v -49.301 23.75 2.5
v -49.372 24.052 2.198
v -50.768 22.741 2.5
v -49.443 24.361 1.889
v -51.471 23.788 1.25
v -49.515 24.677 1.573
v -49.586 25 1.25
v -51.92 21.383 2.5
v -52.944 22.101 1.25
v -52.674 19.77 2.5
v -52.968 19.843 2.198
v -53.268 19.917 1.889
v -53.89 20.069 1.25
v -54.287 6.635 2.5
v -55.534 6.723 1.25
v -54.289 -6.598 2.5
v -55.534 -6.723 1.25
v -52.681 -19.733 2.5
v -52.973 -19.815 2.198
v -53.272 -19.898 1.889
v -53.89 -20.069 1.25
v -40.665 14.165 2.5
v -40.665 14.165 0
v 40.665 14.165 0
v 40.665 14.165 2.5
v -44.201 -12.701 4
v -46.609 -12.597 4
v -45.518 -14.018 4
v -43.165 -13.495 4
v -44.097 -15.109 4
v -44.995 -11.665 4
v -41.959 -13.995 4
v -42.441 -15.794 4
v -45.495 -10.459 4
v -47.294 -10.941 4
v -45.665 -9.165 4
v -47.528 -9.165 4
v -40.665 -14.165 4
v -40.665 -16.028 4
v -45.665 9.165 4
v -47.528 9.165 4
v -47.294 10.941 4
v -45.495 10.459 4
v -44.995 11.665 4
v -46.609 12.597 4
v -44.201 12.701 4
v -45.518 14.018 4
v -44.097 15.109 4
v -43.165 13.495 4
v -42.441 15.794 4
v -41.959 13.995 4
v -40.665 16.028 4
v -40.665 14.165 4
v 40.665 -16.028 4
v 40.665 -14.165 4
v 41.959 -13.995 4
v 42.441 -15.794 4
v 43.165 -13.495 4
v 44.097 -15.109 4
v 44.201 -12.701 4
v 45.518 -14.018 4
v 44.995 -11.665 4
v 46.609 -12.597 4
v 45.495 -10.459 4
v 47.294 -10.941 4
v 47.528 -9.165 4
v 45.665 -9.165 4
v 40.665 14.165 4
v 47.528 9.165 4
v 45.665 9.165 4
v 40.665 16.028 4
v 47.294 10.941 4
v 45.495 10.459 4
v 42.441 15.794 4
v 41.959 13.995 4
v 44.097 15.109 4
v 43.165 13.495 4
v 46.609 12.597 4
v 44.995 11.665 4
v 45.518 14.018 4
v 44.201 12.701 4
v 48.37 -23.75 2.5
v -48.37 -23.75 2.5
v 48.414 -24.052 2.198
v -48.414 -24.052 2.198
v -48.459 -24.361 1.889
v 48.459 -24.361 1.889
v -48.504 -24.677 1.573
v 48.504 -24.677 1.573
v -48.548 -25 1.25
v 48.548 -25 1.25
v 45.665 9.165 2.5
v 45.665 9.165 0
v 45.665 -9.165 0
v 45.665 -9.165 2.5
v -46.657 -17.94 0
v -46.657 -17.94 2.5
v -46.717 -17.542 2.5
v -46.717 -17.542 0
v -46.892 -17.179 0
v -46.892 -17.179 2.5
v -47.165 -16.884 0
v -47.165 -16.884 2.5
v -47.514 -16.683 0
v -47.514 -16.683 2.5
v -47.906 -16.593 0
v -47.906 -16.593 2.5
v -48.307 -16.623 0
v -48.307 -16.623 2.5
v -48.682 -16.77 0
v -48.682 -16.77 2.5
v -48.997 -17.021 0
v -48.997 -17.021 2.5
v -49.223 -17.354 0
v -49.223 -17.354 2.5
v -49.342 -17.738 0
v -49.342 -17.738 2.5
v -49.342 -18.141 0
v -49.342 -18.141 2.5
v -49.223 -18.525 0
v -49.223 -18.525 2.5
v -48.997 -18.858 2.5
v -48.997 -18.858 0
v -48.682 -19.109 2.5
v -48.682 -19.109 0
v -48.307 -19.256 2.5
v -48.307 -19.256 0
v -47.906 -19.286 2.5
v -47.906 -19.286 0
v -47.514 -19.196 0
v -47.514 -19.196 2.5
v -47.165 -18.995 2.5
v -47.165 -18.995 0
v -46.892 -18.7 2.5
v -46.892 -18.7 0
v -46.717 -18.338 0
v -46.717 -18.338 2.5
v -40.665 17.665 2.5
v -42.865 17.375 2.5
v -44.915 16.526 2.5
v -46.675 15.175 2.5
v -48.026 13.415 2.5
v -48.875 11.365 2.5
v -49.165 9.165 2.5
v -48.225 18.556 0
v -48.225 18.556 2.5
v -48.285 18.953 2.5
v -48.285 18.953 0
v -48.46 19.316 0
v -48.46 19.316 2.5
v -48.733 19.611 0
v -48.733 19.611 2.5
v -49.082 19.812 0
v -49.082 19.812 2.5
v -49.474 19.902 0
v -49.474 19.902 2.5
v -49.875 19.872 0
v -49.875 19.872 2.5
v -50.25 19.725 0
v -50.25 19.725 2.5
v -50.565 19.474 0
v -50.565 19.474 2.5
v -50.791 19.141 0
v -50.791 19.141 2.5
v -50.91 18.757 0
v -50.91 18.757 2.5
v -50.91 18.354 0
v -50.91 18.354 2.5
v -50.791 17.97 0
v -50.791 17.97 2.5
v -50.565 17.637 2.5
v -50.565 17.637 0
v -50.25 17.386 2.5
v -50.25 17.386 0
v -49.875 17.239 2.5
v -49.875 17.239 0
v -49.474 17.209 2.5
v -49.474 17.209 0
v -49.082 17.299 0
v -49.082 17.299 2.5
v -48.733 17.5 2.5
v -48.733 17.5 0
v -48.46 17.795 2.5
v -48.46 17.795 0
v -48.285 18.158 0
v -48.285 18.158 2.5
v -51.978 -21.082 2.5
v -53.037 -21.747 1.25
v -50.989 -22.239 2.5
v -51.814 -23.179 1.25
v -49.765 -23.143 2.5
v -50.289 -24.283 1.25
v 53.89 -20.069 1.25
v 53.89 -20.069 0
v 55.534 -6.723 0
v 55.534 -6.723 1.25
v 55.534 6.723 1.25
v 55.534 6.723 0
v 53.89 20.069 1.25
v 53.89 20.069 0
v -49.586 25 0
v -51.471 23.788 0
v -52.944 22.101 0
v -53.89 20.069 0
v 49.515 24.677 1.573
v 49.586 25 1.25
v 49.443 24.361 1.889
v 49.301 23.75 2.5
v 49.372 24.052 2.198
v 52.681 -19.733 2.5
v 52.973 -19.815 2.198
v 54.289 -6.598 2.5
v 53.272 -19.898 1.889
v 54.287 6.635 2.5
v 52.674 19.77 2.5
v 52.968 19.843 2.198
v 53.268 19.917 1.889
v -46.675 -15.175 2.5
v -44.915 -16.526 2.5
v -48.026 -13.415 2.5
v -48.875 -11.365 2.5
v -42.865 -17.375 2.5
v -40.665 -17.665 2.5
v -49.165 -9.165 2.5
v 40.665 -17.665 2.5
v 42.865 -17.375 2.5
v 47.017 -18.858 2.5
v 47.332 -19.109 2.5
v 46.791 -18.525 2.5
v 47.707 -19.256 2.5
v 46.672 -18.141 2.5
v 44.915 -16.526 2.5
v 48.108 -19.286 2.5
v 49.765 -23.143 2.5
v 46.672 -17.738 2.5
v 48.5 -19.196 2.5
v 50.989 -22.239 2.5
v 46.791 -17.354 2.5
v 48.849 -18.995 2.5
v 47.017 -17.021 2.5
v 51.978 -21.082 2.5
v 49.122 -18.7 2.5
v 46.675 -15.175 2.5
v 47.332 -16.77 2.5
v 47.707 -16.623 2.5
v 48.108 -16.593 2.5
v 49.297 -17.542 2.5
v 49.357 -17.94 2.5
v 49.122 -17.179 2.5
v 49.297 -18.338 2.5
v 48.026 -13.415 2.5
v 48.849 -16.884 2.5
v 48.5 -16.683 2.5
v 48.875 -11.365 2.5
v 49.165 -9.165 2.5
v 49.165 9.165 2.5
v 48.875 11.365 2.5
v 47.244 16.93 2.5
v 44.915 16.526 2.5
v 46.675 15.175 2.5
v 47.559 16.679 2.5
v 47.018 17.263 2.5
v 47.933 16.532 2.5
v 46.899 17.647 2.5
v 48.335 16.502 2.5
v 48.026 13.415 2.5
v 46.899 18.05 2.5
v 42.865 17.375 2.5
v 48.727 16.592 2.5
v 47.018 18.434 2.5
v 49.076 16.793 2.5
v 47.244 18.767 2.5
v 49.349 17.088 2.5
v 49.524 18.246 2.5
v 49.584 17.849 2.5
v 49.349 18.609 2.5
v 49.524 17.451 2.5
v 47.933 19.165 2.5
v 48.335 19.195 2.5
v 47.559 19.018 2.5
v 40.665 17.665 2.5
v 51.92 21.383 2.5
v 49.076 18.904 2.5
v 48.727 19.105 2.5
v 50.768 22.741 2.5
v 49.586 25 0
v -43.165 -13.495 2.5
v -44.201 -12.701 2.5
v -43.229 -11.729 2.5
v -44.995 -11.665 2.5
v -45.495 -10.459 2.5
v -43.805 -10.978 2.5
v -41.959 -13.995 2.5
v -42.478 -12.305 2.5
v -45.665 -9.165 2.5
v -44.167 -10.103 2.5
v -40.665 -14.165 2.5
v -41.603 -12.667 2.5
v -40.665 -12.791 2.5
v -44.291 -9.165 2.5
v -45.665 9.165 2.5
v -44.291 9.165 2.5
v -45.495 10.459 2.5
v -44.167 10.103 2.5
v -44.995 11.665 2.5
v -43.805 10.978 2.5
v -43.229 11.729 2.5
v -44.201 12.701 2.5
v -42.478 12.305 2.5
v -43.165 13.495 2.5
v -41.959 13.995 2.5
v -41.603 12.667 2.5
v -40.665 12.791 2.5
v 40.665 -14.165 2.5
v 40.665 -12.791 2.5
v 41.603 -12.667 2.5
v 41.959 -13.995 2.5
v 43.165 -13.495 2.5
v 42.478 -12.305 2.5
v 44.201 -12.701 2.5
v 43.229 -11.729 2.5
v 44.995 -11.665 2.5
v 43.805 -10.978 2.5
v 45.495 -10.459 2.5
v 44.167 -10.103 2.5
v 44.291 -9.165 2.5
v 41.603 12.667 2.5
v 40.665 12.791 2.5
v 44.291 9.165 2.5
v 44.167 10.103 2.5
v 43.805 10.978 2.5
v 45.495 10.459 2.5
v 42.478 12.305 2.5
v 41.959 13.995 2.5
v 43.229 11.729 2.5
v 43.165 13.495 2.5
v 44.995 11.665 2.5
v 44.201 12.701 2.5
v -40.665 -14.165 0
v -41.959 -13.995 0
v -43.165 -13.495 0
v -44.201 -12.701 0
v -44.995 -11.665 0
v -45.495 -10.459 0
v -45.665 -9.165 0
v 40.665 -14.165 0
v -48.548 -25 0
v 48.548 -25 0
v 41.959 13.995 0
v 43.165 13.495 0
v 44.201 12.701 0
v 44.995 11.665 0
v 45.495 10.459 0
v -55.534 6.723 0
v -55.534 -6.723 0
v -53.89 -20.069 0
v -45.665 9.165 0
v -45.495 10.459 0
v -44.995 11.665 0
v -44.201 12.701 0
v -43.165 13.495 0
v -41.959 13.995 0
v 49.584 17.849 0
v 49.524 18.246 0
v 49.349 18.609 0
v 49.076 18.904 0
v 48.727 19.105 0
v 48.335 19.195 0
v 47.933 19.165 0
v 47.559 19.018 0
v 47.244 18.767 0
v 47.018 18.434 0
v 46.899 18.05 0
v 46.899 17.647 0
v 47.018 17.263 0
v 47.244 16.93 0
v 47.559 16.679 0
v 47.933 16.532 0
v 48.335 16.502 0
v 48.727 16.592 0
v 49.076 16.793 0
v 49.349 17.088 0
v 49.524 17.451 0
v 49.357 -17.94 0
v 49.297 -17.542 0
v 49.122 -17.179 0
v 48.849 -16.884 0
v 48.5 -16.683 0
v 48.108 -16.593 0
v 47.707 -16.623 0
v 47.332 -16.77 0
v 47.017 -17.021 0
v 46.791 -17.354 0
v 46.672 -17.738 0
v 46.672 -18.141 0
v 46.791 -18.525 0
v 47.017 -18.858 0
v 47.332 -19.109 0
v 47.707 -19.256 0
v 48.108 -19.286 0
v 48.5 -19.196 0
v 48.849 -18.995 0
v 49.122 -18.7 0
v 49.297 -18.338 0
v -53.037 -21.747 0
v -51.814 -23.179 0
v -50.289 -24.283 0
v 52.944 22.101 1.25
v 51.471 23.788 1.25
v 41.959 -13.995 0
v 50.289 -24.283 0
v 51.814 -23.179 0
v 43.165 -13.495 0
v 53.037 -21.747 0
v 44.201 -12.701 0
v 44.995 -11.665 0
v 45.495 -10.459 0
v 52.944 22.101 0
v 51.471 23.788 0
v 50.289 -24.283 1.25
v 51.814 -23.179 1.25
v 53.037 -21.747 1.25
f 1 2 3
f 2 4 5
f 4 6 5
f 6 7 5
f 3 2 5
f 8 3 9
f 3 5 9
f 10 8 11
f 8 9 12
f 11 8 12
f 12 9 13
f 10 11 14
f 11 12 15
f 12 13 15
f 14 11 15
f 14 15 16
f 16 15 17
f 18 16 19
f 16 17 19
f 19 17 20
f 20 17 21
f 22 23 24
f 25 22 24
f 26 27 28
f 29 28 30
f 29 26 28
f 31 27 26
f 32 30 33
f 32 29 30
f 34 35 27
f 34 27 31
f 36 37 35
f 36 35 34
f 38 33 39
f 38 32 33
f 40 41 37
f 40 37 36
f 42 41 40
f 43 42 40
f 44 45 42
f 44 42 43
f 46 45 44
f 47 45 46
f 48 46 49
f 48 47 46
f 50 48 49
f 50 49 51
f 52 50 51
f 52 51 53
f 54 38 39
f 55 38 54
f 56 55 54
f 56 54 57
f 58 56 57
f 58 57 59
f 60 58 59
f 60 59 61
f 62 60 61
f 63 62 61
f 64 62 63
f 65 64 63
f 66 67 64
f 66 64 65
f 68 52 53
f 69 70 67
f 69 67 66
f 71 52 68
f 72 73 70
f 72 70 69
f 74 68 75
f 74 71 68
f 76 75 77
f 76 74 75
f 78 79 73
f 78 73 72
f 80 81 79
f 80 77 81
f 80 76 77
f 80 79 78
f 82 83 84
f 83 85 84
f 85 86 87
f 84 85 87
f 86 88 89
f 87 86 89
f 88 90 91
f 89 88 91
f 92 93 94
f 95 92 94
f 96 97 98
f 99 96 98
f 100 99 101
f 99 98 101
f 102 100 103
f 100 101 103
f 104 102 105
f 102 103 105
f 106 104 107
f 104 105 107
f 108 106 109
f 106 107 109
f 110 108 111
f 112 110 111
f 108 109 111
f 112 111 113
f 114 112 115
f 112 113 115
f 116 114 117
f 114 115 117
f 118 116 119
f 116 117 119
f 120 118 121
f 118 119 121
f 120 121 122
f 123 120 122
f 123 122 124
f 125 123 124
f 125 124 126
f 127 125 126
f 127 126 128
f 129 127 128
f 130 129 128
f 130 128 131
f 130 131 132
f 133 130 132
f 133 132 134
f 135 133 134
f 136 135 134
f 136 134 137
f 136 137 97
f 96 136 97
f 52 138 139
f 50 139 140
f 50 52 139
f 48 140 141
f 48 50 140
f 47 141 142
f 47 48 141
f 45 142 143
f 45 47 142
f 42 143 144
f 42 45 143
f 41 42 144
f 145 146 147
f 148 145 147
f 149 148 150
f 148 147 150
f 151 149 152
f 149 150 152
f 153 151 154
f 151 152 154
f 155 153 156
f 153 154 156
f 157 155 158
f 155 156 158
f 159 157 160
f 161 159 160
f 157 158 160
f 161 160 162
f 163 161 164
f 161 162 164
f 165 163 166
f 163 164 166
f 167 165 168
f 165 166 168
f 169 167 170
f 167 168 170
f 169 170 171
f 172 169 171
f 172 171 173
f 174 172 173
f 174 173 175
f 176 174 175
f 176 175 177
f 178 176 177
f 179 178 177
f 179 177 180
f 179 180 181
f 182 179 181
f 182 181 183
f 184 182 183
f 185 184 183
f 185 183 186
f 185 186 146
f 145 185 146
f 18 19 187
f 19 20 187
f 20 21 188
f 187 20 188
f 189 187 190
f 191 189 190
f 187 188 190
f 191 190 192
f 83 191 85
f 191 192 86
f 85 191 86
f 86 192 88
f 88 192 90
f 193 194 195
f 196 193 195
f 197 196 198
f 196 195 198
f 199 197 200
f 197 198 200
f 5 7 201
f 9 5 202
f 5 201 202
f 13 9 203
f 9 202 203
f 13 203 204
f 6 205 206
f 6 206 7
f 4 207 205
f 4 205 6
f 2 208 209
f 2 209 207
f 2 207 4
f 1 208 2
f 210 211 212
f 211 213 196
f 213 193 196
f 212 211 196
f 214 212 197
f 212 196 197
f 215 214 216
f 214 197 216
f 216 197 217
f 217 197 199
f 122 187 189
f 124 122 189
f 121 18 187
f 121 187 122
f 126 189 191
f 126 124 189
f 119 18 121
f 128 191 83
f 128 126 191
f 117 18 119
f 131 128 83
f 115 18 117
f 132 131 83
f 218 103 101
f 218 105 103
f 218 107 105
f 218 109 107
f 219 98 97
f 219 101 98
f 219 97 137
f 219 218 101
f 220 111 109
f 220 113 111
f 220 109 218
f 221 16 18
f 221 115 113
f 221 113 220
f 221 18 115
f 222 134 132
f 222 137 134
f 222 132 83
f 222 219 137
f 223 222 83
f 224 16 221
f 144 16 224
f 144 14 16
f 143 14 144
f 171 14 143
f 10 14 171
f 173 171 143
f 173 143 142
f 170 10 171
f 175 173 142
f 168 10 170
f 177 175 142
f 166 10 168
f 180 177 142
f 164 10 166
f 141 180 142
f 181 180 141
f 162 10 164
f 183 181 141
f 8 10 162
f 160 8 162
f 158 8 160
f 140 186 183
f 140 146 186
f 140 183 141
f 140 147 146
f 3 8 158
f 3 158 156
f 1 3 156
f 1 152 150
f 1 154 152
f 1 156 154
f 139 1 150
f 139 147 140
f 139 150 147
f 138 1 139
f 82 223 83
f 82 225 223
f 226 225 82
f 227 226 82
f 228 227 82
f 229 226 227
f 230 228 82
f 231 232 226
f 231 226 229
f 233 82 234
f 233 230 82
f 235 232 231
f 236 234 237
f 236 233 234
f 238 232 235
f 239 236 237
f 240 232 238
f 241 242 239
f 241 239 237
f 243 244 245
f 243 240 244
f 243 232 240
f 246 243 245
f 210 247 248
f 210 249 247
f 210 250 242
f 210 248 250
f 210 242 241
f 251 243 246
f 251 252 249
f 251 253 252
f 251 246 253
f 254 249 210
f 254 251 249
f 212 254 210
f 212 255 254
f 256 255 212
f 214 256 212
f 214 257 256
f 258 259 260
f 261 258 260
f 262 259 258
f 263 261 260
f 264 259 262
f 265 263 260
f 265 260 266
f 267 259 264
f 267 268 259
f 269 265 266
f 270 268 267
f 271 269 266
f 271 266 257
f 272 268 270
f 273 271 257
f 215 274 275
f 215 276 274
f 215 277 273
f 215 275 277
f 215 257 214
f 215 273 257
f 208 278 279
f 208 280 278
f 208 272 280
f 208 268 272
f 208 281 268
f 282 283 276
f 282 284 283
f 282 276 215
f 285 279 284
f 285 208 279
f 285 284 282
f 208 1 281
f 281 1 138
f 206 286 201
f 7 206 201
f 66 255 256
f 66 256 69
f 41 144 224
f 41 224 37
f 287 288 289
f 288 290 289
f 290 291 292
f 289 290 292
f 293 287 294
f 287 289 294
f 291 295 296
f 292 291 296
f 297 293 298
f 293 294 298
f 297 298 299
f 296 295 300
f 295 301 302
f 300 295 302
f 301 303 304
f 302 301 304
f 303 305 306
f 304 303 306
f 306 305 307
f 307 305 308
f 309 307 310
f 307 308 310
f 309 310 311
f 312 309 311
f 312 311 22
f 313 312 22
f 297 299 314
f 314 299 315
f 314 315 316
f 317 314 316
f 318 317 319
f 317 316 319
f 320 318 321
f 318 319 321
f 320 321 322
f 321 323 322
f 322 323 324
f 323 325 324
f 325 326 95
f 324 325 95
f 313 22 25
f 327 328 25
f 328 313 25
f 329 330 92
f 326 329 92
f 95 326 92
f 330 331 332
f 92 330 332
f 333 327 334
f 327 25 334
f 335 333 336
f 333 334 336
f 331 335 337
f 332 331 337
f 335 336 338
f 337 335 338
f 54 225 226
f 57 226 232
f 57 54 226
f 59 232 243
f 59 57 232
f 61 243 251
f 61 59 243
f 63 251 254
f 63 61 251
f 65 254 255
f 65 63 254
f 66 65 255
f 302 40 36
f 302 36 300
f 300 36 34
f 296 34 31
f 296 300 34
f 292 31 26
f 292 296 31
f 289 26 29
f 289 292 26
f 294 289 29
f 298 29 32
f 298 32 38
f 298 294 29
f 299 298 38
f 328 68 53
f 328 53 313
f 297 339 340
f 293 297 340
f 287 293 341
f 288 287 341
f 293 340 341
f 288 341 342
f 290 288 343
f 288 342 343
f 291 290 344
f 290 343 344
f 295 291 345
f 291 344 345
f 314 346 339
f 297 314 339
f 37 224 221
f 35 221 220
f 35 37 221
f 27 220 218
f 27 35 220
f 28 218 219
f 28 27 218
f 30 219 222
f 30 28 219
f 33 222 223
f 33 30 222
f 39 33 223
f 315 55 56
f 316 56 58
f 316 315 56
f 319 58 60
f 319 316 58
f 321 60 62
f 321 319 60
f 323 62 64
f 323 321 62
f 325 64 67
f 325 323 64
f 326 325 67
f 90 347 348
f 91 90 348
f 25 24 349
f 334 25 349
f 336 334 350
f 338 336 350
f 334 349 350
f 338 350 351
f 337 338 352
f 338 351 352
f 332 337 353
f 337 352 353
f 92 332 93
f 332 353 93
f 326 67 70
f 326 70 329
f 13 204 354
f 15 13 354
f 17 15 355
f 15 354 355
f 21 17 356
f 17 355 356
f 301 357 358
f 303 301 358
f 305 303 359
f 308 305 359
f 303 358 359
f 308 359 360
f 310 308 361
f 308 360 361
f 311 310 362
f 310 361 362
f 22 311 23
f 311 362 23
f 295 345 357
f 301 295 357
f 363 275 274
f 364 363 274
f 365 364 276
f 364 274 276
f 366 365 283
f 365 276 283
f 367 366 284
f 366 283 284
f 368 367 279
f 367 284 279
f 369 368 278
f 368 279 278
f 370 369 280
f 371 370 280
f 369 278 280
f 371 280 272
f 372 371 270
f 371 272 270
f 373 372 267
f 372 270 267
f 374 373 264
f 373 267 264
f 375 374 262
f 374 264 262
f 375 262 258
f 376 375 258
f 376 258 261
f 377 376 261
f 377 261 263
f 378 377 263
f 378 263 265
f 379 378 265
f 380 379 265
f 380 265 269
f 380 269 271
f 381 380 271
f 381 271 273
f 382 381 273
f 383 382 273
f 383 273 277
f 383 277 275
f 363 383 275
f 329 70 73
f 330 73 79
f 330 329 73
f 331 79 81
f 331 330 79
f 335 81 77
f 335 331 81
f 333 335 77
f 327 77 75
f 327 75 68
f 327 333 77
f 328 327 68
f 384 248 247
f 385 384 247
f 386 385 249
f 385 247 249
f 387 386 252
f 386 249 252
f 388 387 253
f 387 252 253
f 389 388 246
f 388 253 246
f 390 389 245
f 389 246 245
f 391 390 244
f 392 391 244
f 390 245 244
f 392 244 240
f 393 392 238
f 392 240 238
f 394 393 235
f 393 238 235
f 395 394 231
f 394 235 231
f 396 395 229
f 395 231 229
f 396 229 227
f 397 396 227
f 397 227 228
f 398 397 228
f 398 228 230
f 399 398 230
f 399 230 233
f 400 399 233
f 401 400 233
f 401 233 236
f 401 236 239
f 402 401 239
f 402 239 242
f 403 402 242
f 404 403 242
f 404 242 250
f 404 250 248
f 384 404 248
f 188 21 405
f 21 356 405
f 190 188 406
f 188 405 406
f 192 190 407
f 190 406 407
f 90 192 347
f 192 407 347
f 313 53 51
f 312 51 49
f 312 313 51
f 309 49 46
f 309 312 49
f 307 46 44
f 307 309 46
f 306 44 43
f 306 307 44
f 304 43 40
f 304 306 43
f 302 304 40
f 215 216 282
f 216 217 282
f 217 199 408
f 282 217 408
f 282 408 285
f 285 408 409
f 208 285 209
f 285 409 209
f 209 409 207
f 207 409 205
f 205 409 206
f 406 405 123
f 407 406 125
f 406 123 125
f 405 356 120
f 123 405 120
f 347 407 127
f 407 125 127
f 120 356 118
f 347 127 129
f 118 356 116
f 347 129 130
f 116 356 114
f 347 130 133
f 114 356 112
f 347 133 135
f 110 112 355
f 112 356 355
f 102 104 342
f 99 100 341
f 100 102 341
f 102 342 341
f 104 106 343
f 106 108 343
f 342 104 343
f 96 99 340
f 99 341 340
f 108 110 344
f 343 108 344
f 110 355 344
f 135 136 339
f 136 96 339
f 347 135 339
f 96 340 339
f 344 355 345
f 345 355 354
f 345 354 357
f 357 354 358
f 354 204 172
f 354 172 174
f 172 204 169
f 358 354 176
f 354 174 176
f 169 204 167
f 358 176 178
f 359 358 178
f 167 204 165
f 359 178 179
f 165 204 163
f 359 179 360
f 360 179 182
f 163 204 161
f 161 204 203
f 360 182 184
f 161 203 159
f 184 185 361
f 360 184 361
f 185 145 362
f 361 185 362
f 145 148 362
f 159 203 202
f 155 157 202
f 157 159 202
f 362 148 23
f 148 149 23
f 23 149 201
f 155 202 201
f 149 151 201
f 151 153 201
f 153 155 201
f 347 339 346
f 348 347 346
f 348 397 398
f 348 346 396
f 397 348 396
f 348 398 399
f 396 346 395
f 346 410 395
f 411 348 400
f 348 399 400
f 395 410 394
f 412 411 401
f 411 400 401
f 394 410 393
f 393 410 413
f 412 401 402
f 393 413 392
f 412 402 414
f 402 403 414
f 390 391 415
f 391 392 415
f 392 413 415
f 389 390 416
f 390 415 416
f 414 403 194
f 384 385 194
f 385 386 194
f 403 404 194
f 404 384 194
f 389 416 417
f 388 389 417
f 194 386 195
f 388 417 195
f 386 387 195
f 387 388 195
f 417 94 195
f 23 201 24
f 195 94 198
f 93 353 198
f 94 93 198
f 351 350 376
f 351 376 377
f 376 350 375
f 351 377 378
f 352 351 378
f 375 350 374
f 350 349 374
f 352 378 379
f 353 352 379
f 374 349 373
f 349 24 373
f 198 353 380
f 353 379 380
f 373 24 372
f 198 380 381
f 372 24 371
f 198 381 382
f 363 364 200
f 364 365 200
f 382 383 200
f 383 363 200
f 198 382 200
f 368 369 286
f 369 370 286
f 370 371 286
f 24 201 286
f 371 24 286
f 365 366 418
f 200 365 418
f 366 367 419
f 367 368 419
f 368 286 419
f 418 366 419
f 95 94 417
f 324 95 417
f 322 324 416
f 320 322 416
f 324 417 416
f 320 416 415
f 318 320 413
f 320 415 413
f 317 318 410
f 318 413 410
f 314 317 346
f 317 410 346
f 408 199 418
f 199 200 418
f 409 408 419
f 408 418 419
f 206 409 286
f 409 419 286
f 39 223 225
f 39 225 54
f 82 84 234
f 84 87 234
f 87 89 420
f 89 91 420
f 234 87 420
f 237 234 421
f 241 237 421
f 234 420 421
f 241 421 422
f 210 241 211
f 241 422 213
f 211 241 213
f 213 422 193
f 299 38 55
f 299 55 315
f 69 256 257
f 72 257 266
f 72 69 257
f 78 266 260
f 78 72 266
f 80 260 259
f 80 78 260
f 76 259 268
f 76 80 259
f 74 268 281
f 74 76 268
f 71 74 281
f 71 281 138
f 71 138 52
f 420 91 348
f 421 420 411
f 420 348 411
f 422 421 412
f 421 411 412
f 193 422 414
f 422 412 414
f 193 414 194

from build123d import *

# Parameters (mm, degrees)
BOSS_EXTRUDE1_DEPTH = 2.5
CHAMFER1_SIZE       = 1.25
SKETCH2_R           = 1.35
CUT_EXTRUDE1_DEPTH  = 62.140801434
BOSS_EXTRUDE2_DEPTH = 1.5
CHAMFER2_SIZE       = 1.5
CHAMFER2_SIZE_2     = 1.636962752


with BuildPart() as part:
    # Sketch1 → Boss-Extrude1 (new body)
    with BuildSketch(Plane.XY):
        with BuildLine():
            Line((49.586181166, 25), (-49.586181166, 25))
            ThreePointArc((-49.586181166, 25), (-52.267168909, 22.996486369), (-53.890165841, 20.069432712))
            ThreePointArc((-53.890165841, 20.069432712), (-55.74, 0), (-53.890165841, -20.069432712))
            ThreePointArc((-53.890165841, -20.069432712), (-51.813555608, -23.178667596), (-48.548222563, -25))
            Line((-48.548222563, -25), (48.548222563, -25))
            ThreePointArc((48.548222563, -25), (51.813555608, -23.178667596), (53.890165841, -20.069432712))
            ThreePointArc((53.890165841, -20.069432712), (55.74, 0), (53.890165841, 20.069432712))
            ThreePointArc((53.890165841, 20.069432712), (52.267168909, 22.996486369), (49.586181166, 25))
        make_face()
        with BuildLine():
            Line((-40.665, 14.165), (40.665, 14.165))
            ThreePointArc((40.665, 14.165), (44.200533906, 12.700533906), (45.665, 9.165))
            Line((45.665, 9.165), (45.665, -9.165))
            ThreePointArc((45.665, -9.165), (44.200533906, -12.700533906), (40.665, -14.165))
            Line((40.665, -14.165), (-40.665, -14.165))
            ThreePointArc((-40.665, -14.165), (-44.200533906, -12.700533906), (-45.665, -9.165))
            Line((-45.665, -9.165), (-45.665, 9.165))
            ThreePointArc((-45.665, 9.165), (-44.200533906, 12.700533906), (-40.665, 14.165))
        make_face(mode=Mode.SUBTRACT)
    extrude(amount=BOSS_EXTRUDE1_DEPTH)

    # Chamfer1
    chamfer1_edges = [part.edges().sort_by_distance(p)[0] for p in [
        (0, 25, 2.5),
    ]]
    chamfer(chamfer1_edges, length=CHAMFER1_SIZE)
    chamfer1_2_edges = [part.edges().sort_by_distance(p)[0] for p in [
        (-55.74, 0, 2.5),
    ]]
    chamfer(chamfer1_2_edges, length=CHAMFER1_SIZE)
    chamfer1_3_edges = [part.edges().sort_by_distance(p)[0] for p in [
        (0, -25, 2.5),
    ]]
    chamfer(chamfer1_3_edges, length=CHAMFER1_SIZE)
    chamfer1_4_edges = [part.edges().sort_by_distance(p)[0] for p in [
        (55.74, 0, 2.5),
    ]]
    chamfer(chamfer1_4_edges, length=CHAMFER1_SIZE)
    chamfer1_5_edges = [part.edges().sort_by_distance(p)[0] for p in [
        (51.737177521, 23.54787863, 2.5),
    ]]
    chamfer(chamfer1_5_edges, length=CHAMFER1_SIZE)
    chamfer1_6_edges = [part.edges().sort_by_distance(p)[0] for p in [
        (-51.737177521, 23.54787863, 2.5),
    ]]
    chamfer(chamfer1_6_edges, length=CHAMFER1_SIZE)
    chamfer1_7_edges = [part.edges().sort_by_distance(p)[0] for p in [
        (-51.5906008, -23.376861633, 2.5),
    ]]
    chamfer(chamfer1_7_edges, length=CHAMFER1_SIZE)
    chamfer1_8_edges = [part.edges().sort_by_distance(p)[0] for p in [
        (51.5906008, -23.376861633, 2.5),
    ]]
    chamfer(chamfer1_8_edges, length=CHAMFER1_SIZE)

    # Sketch2 → Cut-Extrude1 (cut, through all)
    with BuildSketch(Plane.XY.offset(2.5)):
        with Locations((-48.007044757, -17.939600751)):
            Circle(SKETCH2_R)
        with Locations((-49.574960594, 18.555541297)):
            Circle(SKETCH2_R)
        with Locations((48.233851408, 17.848510138)):
            Circle(SKETCH2_R)
        with Locations((48.007044757, -17.939600751)):
            Circle(SKETCH2_R)
    extrude(amount=-CUT_EXTRUDE1_DEPTH, mode=Mode.SUBTRACT)

    # Sketch3 → Boss-Extrude2 (add)
    with BuildSketch(Plane.XY.offset(2.5)):
        with BuildLine():
            Line((49.165, -9.165), (49.165, 9.165))
            ThreePointArc((49.165, 9.165), (46.67540764, 15.17540764), (40.665, 17.665))
            Line((40.665, 17.665), (-40.665, 17.665))
            ThreePointArc((-40.665, 17.665), (-46.67540764, 15.17540764), (-49.165, 9.165))
            Line((-49.165, 9.165), (-49.165, -9.165))
            ThreePointArc((-49.165, -9.165), (-46.67540764, -15.17540764), (-40.665, -17.665))
            Line((-40.665, -17.665), (40.665, -17.665))
            ThreePointArc((40.665, -17.665), (46.67540764, -15.17540764), (49.165, -9.165))
        make_face()
        with BuildLine():
            Line((44.165, -9.165), (44.165, 9.165))
            ThreePointArc((44.165, 9.165), (43.139873734, 11.639873734), (40.665, 12.665))
            Line((40.665, 12.665), (-40.665, 12.665))
            ThreePointArc((-40.665, 12.665), (-43.139873734, 11.639873734), (-44.165, 9.165))
            Line((-44.165, 9.165), (-44.165, -9.165))
            ThreePointArc((-44.165, -9.165), (-43.139873734, -11.639873734), (-40.665, -12.665))
            Line((-40.665, -12.665), (40.665, -12.665))
            ThreePointArc((40.665, -12.665), (43.139873734, -11.639873734), (44.165, -9.165))
        make_face(mode=Mode.SUBTRACT)
    extrude(amount=BOSS_EXTRUDE2_DEPTH)

    # Chamfer2
    # the kernel refuses this chamfer: 1.636962752, 1.5 mm, written as the material it takes off along each edge
    with BuildSketch(Plane(origin=(-40.665, 9.165, 4), x_dir=(0, 1, 0), z_dir=(1, 0, 0))) as chamfer2_piece_1:
        Polygon((3.5 + CHAMFER2_SIZE, 0), (3.5, -CHAMFER2_SIZE_2), (3.5, 0), align=None)
    revolve(axis=Axis((-40.665, 9.165, 4), (0, 0, 1)), revolution_arc=90, mode=Mode.SUBTRACT)
    with BuildSketch(Plane(origin=(-44.165, 9.165, 4), x_dir=(-0.9995117036729907, 0, 0.031246667353746753), z_dir=(0, -1, 0)), Plane(origin=(44.165, -9.165, 4), x_dir=(0.9995117036729907, 0, 0.031246667353746753), z_dir=(0, 1, 0))) as chamfer2_piece_2:
        Polygon((CHAMFER2_SIZE * 0.999511703673, CHAMFER2_SIZE * 0.0312466673537), (-CHAMFER2_SIZE_2 * 0.0312466673462, CHAMFER2_SIZE_2 * 0.999511703431), (0, 0), align=None)
    extrude(amount=18.33, mode=Mode.SUBTRACT)
    with BuildSketch(Plane(origin=(-40.665, -9.165, 4), x_dir=(-1, 0, 0), z_dir=(0, 1, 0))) as chamfer2_piece_3:
        Polygon((3.5 + CHAMFER2_SIZE, 0), (3.5, -CHAMFER2_SIZE_2), (3.5, 0), align=None)
    revolve(axis=Axis((-40.665, -9.165, 4), (0, 0, 1)), revolution_arc=90, mode=Mode.SUBTRACT)
    with BuildSketch(Plane(origin=(-40.665, -12.665, 4), x_dir=(0, -0.9995117036729907, 0.031246667353746788), z_dir=(1, 0, 0)), Plane(origin=(40.665, 12.665, 4), x_dir=(0, 0.9995117036729907, 0.031246667353746788), z_dir=(-1, 0, 0))) as chamfer2_piece_4:
        Polygon((CHAMFER2_SIZE * 0.999511703673, CHAMFER2_SIZE * 0.0312466673537), (-CHAMFER2_SIZE_2 * 0.0312466673462, CHAMFER2_SIZE_2 * 0.999511703431), (0, 0), align=None)
    extrude(amount=81.33, mode=Mode.SUBTRACT)
    with BuildSketch(Plane(origin=(40.665, -9.165, 4), x_dir=(0, -1, 0), z_dir=(-1, 0, 0))) as chamfer2_piece_5:
        Polygon((3.5 + CHAMFER2_SIZE, 0), (3.5, -CHAMFER2_SIZE_2), (3.5, 0), align=None)
    revolve(axis=Axis((40.665, -9.165, 4), (0, 0, 1)), revolution_arc=90, mode=Mode.SUBTRACT)
    with BuildSketch(Plane(origin=(40.665, 9.165, 4), x_dir=(1, 0, 0), z_dir=(0, -1, 0))) as chamfer2_piece_6:
        Polygon((3.5 + CHAMFER2_SIZE, 0), (3.5, -CHAMFER2_SIZE_2), (3.5, 0), align=None)
    revolve(axis=Axis((40.665, 9.165, 4), (0, 0, 1)), revolution_arc=90, mode=Mode.SUBTRACT)
    with BuildSketch(Plane(origin=(49.165, -9.165, 4), x_dir=(0.03124666735374564, 0, -0.9995117036729907), z_dir=(0, 1, 0))) as chamfer2_piece_7_section:
        Polygon((CHAMFER2_SIZE * 0.999511703673, CHAMFER2_SIZE * 0.0312466673537), (-CHAMFER2_SIZE_2 * 0.0312466673462, CHAMFER2_SIZE_2 * 0.999511703431), (0, 0), align=None)
    chamfer2_piece_7 = extrude(amount=18.33, mode=Mode.PRIVATE)
    chamfer2_piece_7 = split(chamfer2_piece_7, bisect_by=Plane(origin=(48.622856571, 0, 2.5), z_dir=(0, 0, 1)), keep=Keep.TOP, mode=Mode.PRIVATE)
    add(chamfer2_piece_7, mode=Mode.SUBTRACT)
    with BuildSketch(Plane(origin=(40.665, -9.165, 4), x_dir=(0, -1, 0), z_dir=(-1, 0, 0))) as chamfer2_piece_8_section:
        Polygon((8.5, -CHAMFER2_SIZE), (8.5 - CHAMFER2_SIZE_2, 0), (8.5, 0), align=None)
    chamfer2_piece_8 = revolve(axis=Axis((40.665, -9.165, 4), (0, 0, 1)), revolution_arc=90, mode=Mode.PRIVATE)
    chamfer2_piece_8 = split(chamfer2_piece_8, bisect_by=Plane(origin=(46.09185199, -14.59185199, 2.5), z_dir=(0, 0, 1)), keep=Keep.TOP, mode=Mode.PRIVATE)
    add(chamfer2_piece_8, mode=Mode.SUBTRACT)
    with BuildSketch(Plane(origin=(-40.665, -17.665, 4), x_dir=(0, -0.03124666735374564, -0.9995117036729907), z_dir=(1, 0, 0))) as chamfer2_piece_9_section:
        Polygon((CHAMFER2_SIZE * 0.999511703673, CHAMFER2_SIZE * 0.0312466673537), (-CHAMFER2_SIZE_2 * 0.0312466673462, CHAMFER2_SIZE_2 * 0.999511703431), (0, 0), align=None)
    chamfer2_piece_9 = extrude(amount=81.33, mode=Mode.PRIVATE)
    chamfer2_piece_9 = split(chamfer2_piece_9, bisect_by=Plane(origin=(0, -17.122856571, 2.5), z_dir=(0, 0, 1)), keep=Keep.TOP, mode=Mode.PRIVATE)
    add(chamfer2_piece_9, mode=Mode.SUBTRACT)
    with BuildSketch(Plane(origin=(-40.665, -9.165, 4), x_dir=(-1, 0, 0), z_dir=(0, 1, 0))) as chamfer2_piece_10_section:
        Polygon((8.5, -CHAMFER2_SIZE), (8.5 - CHAMFER2_SIZE_2, 0), (8.5, 0), align=None)
    chamfer2_piece_10 = revolve(axis=Axis((-40.665, -9.165, 4), (0, 0, 1)), revolution_arc=90, mode=Mode.PRIVATE)
    chamfer2_piece_10 = split(chamfer2_piece_10, bisect_by=Plane(origin=(-46.09185199, -14.59185199, 2.5), z_dir=(0, 0, 1)), keep=Keep.TOP, mode=Mode.PRIVATE)
    add(chamfer2_piece_10, mode=Mode.SUBTRACT)
    with BuildSketch(Plane(origin=(-49.165, 9.165, 4), x_dir=(-0.03124666735374564, 0, -0.9995117036729907), z_dir=(0, -1, 0))) as chamfer2_piece_11_section:
        Polygon((CHAMFER2_SIZE * 0.999511703673, CHAMFER2_SIZE * 0.0312466673537), (-CHAMFER2_SIZE_2 * 0.0312466673462, CHAMFER2_SIZE_2 * 0.999511703431), (0, 0), align=None)
    chamfer2_piece_11 = extrude(amount=18.33, mode=Mode.PRIVATE)
    chamfer2_piece_11 = split(chamfer2_piece_11, bisect_by=Plane(origin=(-48.622856571, 0, 2.5), z_dir=(0, 0, 1)), keep=Keep.TOP, mode=Mode.PRIVATE)
    add(chamfer2_piece_11, mode=Mode.SUBTRACT)
    with BuildSketch(Plane(origin=(-40.665, 9.165, 4), x_dir=(0, 1, 0), z_dir=(1, 0, 0))) as chamfer2_piece_12_section:
        Polygon((8.5, -CHAMFER2_SIZE), (8.5 - CHAMFER2_SIZE_2, 0), (8.5, 0), align=None)
    chamfer2_piece_12 = revolve(axis=Axis((-40.665, 9.165, 4), (0, 0, 1)), revolution_arc=90, mode=Mode.PRIVATE)
    chamfer2_piece_12 = split(chamfer2_piece_12, bisect_by=Plane(origin=(-46.09185199, 14.59185199, 2.5), z_dir=(0, 0, 1)), keep=Keep.TOP, mode=Mode.PRIVATE)
    add(chamfer2_piece_12, mode=Mode.SUBTRACT)
    with BuildSketch(Plane(origin=(40.665, 17.665, 4), x_dir=(0, 0.03124666735374564, -0.9995117036729907), z_dir=(-1, 0, 0))) as chamfer2_piece_13_section:
        Polygon((CHAMFER2_SIZE * 0.999511703673, CHAMFER2_SIZE * 0.0312466673537), (-CHAMFER2_SIZE_2 * 0.0312466673462, CHAMFER2_SIZE_2 * 0.999511703431), (0, 0), align=None)
    chamfer2_piece_13 = extrude(amount=81.33, mode=Mode.PRIVATE)
    chamfer2_piece_13 = split(chamfer2_piece_13, bisect_by=Plane(origin=(0, 17.122856571, 2.5), z_dir=(0, 0, 1)), keep=Keep.TOP, mode=Mode.PRIVATE)
    add(chamfer2_piece_13, mode=Mode.SUBTRACT)
    with BuildSketch(Plane(origin=(40.665, 9.165, 4), x_dir=(1, 0, 0), z_dir=(0, -1, 0))) as chamfer2_piece_14_section:
        Polygon((8.5, -CHAMFER2_SIZE), (8.5 - CHAMFER2_SIZE_2, 0), (8.5, 0), align=None)
    chamfer2_piece_14 = revolve(axis=Axis((40.665, 9.165, 4), (0, 0, 1)), revolution_arc=90, mode=Mode.PRIVATE)
    chamfer2_piece_14 = split(chamfer2_piece_14, bisect_by=Plane(origin=(46.09185199, 14.59185199, 2.5), z_dir=(0, 0, 1)), keep=Keep.TOP, mode=Mode.PRIVATE)
    add(chamfer2_piece_14, mode=Mode.SUBTRACT)


solid = part.part
